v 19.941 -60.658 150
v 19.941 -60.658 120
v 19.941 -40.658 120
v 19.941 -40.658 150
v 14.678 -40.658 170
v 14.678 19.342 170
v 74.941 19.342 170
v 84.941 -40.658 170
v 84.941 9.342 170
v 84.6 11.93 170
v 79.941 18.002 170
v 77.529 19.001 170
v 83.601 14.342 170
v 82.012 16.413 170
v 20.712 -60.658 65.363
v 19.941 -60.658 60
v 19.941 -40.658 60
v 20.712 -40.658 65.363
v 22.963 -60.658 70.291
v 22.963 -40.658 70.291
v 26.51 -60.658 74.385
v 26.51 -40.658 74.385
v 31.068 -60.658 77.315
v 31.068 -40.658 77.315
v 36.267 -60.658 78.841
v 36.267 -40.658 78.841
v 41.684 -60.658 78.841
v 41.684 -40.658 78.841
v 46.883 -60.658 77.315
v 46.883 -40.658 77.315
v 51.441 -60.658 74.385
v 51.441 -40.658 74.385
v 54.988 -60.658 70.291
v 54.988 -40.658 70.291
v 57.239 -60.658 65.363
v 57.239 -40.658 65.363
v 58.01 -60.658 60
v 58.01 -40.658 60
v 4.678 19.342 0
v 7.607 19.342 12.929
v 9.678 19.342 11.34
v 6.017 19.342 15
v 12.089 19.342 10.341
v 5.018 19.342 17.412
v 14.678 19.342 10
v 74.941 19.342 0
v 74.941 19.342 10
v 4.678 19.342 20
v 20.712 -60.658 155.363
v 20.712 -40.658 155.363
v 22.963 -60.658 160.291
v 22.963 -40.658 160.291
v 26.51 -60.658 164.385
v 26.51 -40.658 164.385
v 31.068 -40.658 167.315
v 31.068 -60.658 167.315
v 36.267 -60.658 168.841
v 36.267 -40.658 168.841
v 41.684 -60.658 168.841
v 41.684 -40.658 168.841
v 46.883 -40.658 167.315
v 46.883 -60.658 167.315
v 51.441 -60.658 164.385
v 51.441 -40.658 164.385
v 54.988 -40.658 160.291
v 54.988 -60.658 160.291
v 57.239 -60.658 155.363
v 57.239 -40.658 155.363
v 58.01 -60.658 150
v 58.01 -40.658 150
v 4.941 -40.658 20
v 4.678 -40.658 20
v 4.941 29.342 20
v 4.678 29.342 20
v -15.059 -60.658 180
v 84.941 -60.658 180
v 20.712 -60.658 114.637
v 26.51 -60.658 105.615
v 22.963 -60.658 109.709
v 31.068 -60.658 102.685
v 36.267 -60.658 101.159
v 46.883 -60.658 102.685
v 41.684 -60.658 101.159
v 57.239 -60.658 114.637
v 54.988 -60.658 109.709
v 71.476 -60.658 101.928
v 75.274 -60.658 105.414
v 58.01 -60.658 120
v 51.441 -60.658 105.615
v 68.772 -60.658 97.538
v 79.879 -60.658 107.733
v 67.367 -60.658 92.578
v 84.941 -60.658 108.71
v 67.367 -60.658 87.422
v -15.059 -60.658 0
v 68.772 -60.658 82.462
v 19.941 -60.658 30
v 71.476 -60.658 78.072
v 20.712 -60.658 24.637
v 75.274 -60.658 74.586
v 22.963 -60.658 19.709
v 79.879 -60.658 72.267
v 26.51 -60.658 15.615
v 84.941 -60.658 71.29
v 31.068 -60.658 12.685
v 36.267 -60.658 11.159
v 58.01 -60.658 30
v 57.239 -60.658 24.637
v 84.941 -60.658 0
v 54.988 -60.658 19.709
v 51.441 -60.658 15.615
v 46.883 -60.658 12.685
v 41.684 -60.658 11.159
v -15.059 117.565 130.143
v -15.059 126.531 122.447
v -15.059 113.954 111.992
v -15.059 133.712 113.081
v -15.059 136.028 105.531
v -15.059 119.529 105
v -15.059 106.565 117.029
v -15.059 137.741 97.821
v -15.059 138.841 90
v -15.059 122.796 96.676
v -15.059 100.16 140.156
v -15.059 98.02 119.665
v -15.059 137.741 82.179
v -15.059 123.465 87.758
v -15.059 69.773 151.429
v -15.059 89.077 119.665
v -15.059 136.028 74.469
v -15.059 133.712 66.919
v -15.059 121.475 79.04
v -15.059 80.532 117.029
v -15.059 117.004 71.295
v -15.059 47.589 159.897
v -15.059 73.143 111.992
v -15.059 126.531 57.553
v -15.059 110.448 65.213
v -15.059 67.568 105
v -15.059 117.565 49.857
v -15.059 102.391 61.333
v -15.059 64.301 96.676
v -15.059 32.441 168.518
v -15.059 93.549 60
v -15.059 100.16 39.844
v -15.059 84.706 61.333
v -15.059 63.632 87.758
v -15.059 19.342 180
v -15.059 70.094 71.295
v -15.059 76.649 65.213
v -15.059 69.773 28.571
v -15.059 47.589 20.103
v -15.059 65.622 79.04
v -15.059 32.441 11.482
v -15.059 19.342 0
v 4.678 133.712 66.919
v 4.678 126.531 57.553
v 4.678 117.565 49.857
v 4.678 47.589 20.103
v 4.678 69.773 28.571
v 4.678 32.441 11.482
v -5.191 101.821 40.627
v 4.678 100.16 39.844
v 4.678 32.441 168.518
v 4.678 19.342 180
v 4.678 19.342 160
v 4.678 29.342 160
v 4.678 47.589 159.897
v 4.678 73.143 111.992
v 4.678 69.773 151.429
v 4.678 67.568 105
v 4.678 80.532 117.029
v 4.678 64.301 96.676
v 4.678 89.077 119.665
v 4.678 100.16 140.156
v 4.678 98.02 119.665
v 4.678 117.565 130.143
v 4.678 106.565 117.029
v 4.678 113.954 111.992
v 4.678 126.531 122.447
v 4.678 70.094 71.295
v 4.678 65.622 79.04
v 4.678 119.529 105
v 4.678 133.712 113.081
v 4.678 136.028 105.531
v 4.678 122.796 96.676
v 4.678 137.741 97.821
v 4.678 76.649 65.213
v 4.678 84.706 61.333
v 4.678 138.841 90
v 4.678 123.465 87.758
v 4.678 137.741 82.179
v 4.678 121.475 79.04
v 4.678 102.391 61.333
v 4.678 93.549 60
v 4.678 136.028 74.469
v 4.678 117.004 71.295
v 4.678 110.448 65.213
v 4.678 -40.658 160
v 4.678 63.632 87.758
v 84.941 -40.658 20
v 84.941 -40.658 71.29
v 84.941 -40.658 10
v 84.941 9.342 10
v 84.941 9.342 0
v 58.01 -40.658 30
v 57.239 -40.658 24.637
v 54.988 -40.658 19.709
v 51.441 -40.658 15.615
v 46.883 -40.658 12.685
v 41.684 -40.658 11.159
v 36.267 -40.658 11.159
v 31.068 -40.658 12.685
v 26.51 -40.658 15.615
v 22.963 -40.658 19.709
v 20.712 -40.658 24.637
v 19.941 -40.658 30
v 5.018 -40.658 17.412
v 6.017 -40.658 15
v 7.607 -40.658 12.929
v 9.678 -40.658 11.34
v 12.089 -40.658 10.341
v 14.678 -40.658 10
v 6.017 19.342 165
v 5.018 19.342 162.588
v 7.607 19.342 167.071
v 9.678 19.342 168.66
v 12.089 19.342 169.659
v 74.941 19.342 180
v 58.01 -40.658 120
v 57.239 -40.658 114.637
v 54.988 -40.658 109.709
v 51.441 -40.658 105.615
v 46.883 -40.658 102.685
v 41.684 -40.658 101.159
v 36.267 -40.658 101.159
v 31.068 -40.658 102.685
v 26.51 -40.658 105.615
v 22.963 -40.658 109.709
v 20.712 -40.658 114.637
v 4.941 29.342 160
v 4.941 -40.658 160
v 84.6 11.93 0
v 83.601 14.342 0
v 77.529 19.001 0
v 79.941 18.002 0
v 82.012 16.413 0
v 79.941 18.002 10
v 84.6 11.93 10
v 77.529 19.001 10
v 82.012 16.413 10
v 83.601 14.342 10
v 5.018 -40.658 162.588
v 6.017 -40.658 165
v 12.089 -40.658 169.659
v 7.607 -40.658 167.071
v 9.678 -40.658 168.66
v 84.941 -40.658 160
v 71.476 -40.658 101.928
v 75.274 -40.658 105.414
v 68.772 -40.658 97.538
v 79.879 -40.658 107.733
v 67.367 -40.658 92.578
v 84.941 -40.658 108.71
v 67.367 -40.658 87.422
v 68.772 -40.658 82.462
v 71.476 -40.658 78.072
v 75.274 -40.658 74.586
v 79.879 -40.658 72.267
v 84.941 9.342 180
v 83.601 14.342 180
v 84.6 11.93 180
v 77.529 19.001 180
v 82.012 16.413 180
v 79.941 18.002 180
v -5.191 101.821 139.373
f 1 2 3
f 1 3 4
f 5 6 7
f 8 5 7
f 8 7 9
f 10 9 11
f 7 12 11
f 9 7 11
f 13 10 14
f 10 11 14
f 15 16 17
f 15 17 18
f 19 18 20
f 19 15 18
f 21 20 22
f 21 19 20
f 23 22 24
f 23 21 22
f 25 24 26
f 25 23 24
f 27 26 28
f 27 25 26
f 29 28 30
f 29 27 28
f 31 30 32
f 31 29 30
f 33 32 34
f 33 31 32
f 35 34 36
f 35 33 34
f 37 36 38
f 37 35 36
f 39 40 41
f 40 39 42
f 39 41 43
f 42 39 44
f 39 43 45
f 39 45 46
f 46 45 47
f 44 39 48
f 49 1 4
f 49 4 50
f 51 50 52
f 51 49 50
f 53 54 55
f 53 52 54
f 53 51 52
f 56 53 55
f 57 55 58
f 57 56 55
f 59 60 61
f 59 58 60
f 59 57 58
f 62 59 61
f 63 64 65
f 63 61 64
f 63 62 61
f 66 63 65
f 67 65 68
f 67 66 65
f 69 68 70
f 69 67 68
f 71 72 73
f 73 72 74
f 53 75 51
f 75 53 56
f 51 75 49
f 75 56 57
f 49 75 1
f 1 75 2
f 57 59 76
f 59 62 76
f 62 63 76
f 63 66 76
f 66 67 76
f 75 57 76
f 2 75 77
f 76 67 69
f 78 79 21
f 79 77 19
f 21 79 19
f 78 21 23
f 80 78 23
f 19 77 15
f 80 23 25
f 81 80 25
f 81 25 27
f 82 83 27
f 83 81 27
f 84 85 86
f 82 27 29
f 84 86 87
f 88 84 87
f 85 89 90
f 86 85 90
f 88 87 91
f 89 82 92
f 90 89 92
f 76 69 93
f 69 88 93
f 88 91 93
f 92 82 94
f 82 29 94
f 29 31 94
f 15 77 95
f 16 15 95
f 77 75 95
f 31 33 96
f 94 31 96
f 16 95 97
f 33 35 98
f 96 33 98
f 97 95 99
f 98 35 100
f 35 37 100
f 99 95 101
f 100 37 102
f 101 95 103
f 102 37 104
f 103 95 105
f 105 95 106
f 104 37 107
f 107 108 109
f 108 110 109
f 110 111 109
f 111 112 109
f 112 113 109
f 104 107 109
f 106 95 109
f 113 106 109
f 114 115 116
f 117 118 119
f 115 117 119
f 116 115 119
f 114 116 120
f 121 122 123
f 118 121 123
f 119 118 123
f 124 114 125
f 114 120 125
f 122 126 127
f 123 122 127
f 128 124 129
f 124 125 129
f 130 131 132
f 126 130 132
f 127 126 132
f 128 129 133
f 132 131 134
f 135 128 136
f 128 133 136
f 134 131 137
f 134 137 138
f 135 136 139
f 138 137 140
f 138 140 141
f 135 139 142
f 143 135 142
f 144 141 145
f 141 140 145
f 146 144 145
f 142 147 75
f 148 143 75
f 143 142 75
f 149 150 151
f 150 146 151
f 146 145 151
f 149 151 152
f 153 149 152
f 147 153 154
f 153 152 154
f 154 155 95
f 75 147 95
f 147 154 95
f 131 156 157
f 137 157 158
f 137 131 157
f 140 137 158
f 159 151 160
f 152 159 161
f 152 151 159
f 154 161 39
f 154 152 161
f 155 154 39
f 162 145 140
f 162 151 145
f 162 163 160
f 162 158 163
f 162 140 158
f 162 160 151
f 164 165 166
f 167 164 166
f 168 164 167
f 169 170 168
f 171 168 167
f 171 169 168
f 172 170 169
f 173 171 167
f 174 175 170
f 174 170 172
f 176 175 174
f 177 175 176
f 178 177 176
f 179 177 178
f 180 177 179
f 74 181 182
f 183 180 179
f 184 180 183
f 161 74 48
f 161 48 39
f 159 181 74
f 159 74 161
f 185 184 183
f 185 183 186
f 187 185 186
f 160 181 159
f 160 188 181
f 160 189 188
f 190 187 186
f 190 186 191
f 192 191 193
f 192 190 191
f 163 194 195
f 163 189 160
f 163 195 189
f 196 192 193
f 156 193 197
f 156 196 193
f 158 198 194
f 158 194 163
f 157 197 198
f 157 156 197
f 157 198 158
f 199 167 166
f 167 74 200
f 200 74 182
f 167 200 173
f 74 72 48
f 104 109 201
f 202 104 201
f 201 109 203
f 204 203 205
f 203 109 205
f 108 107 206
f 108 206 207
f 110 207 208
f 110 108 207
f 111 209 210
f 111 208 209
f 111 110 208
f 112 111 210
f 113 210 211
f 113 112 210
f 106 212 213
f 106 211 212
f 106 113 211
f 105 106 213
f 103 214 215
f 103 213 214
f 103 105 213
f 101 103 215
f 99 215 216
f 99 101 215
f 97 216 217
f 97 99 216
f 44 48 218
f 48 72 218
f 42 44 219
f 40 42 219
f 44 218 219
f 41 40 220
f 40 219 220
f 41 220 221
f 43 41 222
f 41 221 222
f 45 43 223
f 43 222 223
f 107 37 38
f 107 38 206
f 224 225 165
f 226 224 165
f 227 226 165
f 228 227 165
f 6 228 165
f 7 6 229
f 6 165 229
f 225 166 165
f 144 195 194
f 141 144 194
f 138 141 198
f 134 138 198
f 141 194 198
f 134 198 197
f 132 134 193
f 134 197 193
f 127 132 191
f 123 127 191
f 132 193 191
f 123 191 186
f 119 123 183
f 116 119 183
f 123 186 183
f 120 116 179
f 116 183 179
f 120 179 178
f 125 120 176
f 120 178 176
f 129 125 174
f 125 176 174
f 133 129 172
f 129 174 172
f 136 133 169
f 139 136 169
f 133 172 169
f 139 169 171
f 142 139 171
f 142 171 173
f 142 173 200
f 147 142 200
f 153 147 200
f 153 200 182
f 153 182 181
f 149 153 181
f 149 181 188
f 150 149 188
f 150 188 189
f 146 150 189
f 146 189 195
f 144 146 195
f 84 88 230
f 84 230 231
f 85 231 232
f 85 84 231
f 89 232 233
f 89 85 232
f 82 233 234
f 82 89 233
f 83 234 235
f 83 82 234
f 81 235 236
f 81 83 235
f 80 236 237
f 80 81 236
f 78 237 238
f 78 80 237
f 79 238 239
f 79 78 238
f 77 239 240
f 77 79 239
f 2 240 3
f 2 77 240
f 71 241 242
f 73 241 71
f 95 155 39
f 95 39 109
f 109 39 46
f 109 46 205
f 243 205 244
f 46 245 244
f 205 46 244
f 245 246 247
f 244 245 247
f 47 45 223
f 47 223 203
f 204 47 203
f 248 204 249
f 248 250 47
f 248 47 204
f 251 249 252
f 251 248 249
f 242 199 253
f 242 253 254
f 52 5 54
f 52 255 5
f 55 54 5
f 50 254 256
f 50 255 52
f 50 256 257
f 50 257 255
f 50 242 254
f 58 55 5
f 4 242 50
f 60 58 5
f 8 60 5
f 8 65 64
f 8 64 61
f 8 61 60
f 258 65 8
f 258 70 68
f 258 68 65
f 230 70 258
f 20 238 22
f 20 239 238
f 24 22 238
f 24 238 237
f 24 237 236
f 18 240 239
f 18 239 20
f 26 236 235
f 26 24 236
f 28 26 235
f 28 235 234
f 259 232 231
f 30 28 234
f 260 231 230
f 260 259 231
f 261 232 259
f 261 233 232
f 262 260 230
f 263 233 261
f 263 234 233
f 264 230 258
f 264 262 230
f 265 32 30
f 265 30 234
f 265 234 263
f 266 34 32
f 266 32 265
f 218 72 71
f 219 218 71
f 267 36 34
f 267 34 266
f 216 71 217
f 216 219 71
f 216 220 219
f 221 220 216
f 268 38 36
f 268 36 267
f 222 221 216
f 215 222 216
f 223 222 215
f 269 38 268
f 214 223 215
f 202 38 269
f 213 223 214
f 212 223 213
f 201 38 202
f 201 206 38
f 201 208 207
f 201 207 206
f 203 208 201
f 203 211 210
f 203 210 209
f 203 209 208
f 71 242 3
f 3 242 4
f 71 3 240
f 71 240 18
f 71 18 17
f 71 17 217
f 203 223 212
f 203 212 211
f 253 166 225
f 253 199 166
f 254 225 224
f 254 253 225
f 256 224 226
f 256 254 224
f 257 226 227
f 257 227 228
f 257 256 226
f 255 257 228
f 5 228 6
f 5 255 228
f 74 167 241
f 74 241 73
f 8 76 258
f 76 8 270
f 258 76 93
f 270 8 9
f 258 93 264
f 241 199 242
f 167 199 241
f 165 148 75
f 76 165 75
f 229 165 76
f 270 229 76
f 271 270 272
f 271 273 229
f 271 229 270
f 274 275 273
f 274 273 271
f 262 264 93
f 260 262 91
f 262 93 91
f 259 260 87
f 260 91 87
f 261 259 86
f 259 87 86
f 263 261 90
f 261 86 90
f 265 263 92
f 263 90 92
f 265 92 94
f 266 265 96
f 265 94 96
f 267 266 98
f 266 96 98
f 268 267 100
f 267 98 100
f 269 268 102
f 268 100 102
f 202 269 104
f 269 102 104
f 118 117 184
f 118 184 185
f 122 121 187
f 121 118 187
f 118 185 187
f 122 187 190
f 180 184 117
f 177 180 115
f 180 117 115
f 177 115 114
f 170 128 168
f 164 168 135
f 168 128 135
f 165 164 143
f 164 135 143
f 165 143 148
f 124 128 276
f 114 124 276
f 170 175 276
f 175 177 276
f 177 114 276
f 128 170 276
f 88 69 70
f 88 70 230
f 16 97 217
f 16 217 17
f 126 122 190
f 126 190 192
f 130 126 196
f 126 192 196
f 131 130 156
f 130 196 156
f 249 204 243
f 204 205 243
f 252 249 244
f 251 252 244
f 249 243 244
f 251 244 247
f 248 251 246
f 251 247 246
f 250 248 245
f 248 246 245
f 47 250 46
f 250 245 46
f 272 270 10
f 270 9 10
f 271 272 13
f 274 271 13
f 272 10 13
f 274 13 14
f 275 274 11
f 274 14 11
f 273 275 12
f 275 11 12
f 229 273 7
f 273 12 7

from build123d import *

# Parameters (mm, degrees)
SALIENTE_EXTRUIR1_DEPTH     = 180
REDONDEO1_R                 = 100
REDONDEO2_R                 = 10
CROQUIS2_W                  = 140
CROQUIS2_H                  = 70
CORTAR_EXTRUIR4_DEPTH       = 90
CROQUIS3_R                  = 30
CORTAR_EXTRUIR5_DEPTH       = 242.078733734
CORTAR_EXTRUIR6_DEPTH       = 282.806134391
CROQUIS5_W                  = 80.263157895
CROQUIS5_H                  = 10
CORTAR_EXTRUIR8_DEPTH       = 70
CROQUIS6_W                  = 80.263157895
CROQUIS6_H                  = 10
CORTAR_EXTRUIR9_DEPTH       = 243.676183384
REDONDEO8_R                 = 10
CORTAR_EXTRUIR10_DEPTH      = 242.078733734
CORTAR_EXTRUIR10_DEPTH_BACK = 242.078733734
CROQUIS8_W                  = 140
CROQUIS8_H                  = 70
SALIENTE_EXTRUIR2_DEPTH     = 10
CROQUIS9_R                  = 18.735611047
CORTAR_EXTRUIR11_DEPTH      = 282.806134525
REDONDEO9_R                 = 10


# Some blends are built 0.0001 mm under size
with BuildPart() as part:
    # Croquis1 → Saliente-Extruir1 (new body)
    with BuildSketch(Plane.XY):
        Polygon((-15.059146237, -60.657894737), (84.940853763, -60.657894737), (84.940853763, 29.342105263), (4.677695868, 29.342105263), (4.677695868, 139.342105263), (-15.059146237, 139.342105263), align=None)
    extrude(amount=SALIENTE_EXTRUIR1_DEPTH)

    # Redondeo1
    # the kernel refuses this fillet: 100 mm, written as the material it takes off along each edge
    with BuildSketch(Plane(origin=(254.677695868, 139.342105263, 180), x_dir=(0, 0, -1), z_dir=(-1, 0, 0))) as redondeo1_piece_1:
        with BuildLine():
            CenterArc((REDONDEO1_R, REDONDEO1_R), REDONDEO1_R, 180, 90)
            Line((0, REDONDEO1_R), (0, 0))
            Line((0, 0), (REDONDEO1_R, 0))
        make_face()
    extrude(amount=519.736842105, mode=Mode.SUBTRACT)
    with BuildSketch(Plane(origin=(254.677695868, 139.342105263, 0), x_dir=(0, 0, 1), z_dir=(-1, 0, 0))) as redondeo1_piece_2:
        with BuildLine():
            CenterArc((REDONDEO1_R, -REDONDEO1_R), REDONDEO1_R, 90, 90)
            Line((0, -REDONDEO1_R), (0, 0))
            Line((0, 0), (REDONDEO1_R, 0))
        make_face()
    extrude(amount=519.736842105, mode=Mode.SUBTRACT)

    # Redondeo2
    redondeo2_edges = [part.edges().sort_by_distance(p)[0] for p in [
        (44.809274816, 29.342105263, 180),
        (44.809274816, 29.342105263, 0),
    ]]
    fillet(redondeo2_edges, radius=REDONDEO2_R)

    # Croquis2 → Cortar-Extruir4 (cut)
    with BuildSketch(Plane(origin=(84.940853763, 0, 0), x_dir=(0, 0, -1), z_dir=(1, 0, 0))):
        with Locations((-90, -5.657894737)):
            Rectangle(CROQUIS2_W, CROQUIS2_H)
    extrude(amount=-CORTAR_EXTRUIR4_DEPTH, mode=Mode.SUBTRACT)

    # Croquis3 → Cortar-Extruir5 (cut, through all)
    with BuildSketch(Plane(origin=(4.677695868, 0, 0), x_dir=(0, 0, -1), z_dir=(1, 0, 0))):
        with Locations((-90, 93.548562432)):
            Circle(CROQUIS3_R)
    extrude(amount=-CORTAR_EXTRUIR5_DEPTH, mode=Mode.SUBTRACT)

    # Croquis4 → Cortar-Extruir6 (cut, through all)
    with BuildSketch(Plane(origin=(0, -60.657894737, 0), x_dir=(-1, 0, 0), z_dir=(0, -1, 0))):
        with BuildLine():
            Line((-58.010173511, -150), (-58.010173511, -120))
            ThreePointArc((-58.010173511, -120), (-38.975513637, -100.965340126), (-19.940853763, -120))
            Line((-19.940853763, -120), (-19.940853763, -150))
            ThreePointArc((-19.940853763, -150), (-38.975513637, -169.034659874), (-58.010173511, -150))
        make_face()
        with BuildLine():
            Line((-58.010173511, -60), (-58.010173511, -30))
            ThreePointArc((-58.010173511, -30), (-38.975513637, -10.965340126), (-19.940853763, -30))
            Line((-19.940853763, -30), (-19.940853763, -60))
            ThreePointArc((-19.940853763, -60), (-38.975513637, -79.034659874), (-58.010173511, -60))
        make_face()
    extrude(amount=-CORTAR_EXTRUIR6_DEPTH, mode=Mode.SUBTRACT)

    # Croquis5 → Cortar-Extruir8 (cut)
    with BuildSketch(Plane(origin=(0, 29.342105263, 0), x_dir=(1, 0, 0), z_dir=(0, 1, 0))):
        with Locations((44.809274816, -15)):
            Rectangle(CROQUIS5_W, CROQUIS5_H)
        with Locations((44.809274816, -165)):
            Rectangle(CROQUIS5_W, CROQUIS5_H)
    extrude(amount=-CORTAR_EXTRUIR8_DEPTH, mode=Mode.SUBTRACT)

    # Croquis6 → Cortar-Extruir9 (cut, through all)
    with BuildSketch(Plane.XY.offset(180)):
        with Locations((44.809274816, 24.342105263)):
            Rectangle(CROQUIS6_W, CROQUIS6_H)
    extrude(amount=-CORTAR_EXTRUIR9_DEPTH, mode=Mode.SUBTRACT)

    # Redondeo8
    redondeo8_edges = [part.edges().sort_by_distance(p)[0] for p in [
        (84.940853763, 19.342105263, 175),
        (84.940853763, 19.342105263, 5),
    ]]
    fillet(redondeo8_edges, radius=REDONDEO8_R)

    # Croquis7 → Cortar-Extruir10 (cut, two sides: drawn at the far end of the back side and taken through both)
    with BuildSketch(Plane(origin=(4.677695868, 0, 0), x_dir=(0, 0, -1), z_dir=(1, 0, 0)).offset(-CORTAR_EXTRUIR10_DEPTH_BACK)):
        with BuildLine():
            add(Edge.make_bspline(
                [(-113.081277055, 133.711746083), (-124.698414262, 126.957224262), (-152.328432442, 87.000878261), (-154.754506131, 42.525291557), (-180, 19.342105263)],
                knots=[0.150275034, 0.150275034, 0.150275034, 0.150275034, 0.412965146, 1, 1, 1, 1], degree=3))
            ThreePointArc((-113.081277055, 133.711746083), (-161.572445426, 97.186172783), (-180, 39.342105263))
            Line((-180, 39.342105263), (-180, 19.342105263))
        make_face()
        with BuildLine():
            ThreePointArc((0, 39.342105263), (-18.427554574, 97.186172783), (-66.918722945, 133.711746083))
            add(Edge.make_bspline(
                [(-66.918722945, 133.711746083), (-55.301585738, 126.957224262), (-27.671567558, 87.000878261), (-25.245493869, 42.525291557), (0, 19.342105263)],
                knots=[0.150275034, 0.150275034, 0.150275034, 0.150275034, 0.412965146, 1, 1, 1, 1], degree=3))
            Line((0, 19.342105263), (0, 39.342105263))
        make_face()
    extrude(amount=CORTAR_EXTRUIR10_DEPTH + CORTAR_EXTRUIR10_DEPTH_BACK, mode=Mode.SUBTRACT)

    # Croquis8 → Saliente-Extruir2 (add)
    with BuildSketch(Plane(origin=(-5.059146237, 0, 0), x_dir=(0, 0, -1), z_dir=(1, 0, 0))):
        with Locations((-90, -5.657894737)):
            Rectangle(CROQUIS8_W, CROQUIS8_H)
    extrude(amount=SALIENTE_EXTRUIR2_DEPTH)

    # Croquis9 → Cortar-Extruir11 (cut, through all)
    with BuildSketch(Plane.XZ.offset(60.657894737)):
        with Locations((85.924060677, 90)):
            Circle(CROQUIS9_R)
    extrude(amount=-CORTAR_EXTRUIR11_DEPTH, mode=Mode.SUBTRACT)

    # Redondeo9
    redondeo9_edges = [part.edges().sort_by_distance(p)[0] for p in [
        (4.677695868, -10.657894737, 170),
        (4.677695868, -10.657894737, 10),
    ]]
    fillet(redondeo9_edges, radius=REDONDEO9_R - 0.0001)  # a hair under: the kernel refuses the full size


solid = part.part
